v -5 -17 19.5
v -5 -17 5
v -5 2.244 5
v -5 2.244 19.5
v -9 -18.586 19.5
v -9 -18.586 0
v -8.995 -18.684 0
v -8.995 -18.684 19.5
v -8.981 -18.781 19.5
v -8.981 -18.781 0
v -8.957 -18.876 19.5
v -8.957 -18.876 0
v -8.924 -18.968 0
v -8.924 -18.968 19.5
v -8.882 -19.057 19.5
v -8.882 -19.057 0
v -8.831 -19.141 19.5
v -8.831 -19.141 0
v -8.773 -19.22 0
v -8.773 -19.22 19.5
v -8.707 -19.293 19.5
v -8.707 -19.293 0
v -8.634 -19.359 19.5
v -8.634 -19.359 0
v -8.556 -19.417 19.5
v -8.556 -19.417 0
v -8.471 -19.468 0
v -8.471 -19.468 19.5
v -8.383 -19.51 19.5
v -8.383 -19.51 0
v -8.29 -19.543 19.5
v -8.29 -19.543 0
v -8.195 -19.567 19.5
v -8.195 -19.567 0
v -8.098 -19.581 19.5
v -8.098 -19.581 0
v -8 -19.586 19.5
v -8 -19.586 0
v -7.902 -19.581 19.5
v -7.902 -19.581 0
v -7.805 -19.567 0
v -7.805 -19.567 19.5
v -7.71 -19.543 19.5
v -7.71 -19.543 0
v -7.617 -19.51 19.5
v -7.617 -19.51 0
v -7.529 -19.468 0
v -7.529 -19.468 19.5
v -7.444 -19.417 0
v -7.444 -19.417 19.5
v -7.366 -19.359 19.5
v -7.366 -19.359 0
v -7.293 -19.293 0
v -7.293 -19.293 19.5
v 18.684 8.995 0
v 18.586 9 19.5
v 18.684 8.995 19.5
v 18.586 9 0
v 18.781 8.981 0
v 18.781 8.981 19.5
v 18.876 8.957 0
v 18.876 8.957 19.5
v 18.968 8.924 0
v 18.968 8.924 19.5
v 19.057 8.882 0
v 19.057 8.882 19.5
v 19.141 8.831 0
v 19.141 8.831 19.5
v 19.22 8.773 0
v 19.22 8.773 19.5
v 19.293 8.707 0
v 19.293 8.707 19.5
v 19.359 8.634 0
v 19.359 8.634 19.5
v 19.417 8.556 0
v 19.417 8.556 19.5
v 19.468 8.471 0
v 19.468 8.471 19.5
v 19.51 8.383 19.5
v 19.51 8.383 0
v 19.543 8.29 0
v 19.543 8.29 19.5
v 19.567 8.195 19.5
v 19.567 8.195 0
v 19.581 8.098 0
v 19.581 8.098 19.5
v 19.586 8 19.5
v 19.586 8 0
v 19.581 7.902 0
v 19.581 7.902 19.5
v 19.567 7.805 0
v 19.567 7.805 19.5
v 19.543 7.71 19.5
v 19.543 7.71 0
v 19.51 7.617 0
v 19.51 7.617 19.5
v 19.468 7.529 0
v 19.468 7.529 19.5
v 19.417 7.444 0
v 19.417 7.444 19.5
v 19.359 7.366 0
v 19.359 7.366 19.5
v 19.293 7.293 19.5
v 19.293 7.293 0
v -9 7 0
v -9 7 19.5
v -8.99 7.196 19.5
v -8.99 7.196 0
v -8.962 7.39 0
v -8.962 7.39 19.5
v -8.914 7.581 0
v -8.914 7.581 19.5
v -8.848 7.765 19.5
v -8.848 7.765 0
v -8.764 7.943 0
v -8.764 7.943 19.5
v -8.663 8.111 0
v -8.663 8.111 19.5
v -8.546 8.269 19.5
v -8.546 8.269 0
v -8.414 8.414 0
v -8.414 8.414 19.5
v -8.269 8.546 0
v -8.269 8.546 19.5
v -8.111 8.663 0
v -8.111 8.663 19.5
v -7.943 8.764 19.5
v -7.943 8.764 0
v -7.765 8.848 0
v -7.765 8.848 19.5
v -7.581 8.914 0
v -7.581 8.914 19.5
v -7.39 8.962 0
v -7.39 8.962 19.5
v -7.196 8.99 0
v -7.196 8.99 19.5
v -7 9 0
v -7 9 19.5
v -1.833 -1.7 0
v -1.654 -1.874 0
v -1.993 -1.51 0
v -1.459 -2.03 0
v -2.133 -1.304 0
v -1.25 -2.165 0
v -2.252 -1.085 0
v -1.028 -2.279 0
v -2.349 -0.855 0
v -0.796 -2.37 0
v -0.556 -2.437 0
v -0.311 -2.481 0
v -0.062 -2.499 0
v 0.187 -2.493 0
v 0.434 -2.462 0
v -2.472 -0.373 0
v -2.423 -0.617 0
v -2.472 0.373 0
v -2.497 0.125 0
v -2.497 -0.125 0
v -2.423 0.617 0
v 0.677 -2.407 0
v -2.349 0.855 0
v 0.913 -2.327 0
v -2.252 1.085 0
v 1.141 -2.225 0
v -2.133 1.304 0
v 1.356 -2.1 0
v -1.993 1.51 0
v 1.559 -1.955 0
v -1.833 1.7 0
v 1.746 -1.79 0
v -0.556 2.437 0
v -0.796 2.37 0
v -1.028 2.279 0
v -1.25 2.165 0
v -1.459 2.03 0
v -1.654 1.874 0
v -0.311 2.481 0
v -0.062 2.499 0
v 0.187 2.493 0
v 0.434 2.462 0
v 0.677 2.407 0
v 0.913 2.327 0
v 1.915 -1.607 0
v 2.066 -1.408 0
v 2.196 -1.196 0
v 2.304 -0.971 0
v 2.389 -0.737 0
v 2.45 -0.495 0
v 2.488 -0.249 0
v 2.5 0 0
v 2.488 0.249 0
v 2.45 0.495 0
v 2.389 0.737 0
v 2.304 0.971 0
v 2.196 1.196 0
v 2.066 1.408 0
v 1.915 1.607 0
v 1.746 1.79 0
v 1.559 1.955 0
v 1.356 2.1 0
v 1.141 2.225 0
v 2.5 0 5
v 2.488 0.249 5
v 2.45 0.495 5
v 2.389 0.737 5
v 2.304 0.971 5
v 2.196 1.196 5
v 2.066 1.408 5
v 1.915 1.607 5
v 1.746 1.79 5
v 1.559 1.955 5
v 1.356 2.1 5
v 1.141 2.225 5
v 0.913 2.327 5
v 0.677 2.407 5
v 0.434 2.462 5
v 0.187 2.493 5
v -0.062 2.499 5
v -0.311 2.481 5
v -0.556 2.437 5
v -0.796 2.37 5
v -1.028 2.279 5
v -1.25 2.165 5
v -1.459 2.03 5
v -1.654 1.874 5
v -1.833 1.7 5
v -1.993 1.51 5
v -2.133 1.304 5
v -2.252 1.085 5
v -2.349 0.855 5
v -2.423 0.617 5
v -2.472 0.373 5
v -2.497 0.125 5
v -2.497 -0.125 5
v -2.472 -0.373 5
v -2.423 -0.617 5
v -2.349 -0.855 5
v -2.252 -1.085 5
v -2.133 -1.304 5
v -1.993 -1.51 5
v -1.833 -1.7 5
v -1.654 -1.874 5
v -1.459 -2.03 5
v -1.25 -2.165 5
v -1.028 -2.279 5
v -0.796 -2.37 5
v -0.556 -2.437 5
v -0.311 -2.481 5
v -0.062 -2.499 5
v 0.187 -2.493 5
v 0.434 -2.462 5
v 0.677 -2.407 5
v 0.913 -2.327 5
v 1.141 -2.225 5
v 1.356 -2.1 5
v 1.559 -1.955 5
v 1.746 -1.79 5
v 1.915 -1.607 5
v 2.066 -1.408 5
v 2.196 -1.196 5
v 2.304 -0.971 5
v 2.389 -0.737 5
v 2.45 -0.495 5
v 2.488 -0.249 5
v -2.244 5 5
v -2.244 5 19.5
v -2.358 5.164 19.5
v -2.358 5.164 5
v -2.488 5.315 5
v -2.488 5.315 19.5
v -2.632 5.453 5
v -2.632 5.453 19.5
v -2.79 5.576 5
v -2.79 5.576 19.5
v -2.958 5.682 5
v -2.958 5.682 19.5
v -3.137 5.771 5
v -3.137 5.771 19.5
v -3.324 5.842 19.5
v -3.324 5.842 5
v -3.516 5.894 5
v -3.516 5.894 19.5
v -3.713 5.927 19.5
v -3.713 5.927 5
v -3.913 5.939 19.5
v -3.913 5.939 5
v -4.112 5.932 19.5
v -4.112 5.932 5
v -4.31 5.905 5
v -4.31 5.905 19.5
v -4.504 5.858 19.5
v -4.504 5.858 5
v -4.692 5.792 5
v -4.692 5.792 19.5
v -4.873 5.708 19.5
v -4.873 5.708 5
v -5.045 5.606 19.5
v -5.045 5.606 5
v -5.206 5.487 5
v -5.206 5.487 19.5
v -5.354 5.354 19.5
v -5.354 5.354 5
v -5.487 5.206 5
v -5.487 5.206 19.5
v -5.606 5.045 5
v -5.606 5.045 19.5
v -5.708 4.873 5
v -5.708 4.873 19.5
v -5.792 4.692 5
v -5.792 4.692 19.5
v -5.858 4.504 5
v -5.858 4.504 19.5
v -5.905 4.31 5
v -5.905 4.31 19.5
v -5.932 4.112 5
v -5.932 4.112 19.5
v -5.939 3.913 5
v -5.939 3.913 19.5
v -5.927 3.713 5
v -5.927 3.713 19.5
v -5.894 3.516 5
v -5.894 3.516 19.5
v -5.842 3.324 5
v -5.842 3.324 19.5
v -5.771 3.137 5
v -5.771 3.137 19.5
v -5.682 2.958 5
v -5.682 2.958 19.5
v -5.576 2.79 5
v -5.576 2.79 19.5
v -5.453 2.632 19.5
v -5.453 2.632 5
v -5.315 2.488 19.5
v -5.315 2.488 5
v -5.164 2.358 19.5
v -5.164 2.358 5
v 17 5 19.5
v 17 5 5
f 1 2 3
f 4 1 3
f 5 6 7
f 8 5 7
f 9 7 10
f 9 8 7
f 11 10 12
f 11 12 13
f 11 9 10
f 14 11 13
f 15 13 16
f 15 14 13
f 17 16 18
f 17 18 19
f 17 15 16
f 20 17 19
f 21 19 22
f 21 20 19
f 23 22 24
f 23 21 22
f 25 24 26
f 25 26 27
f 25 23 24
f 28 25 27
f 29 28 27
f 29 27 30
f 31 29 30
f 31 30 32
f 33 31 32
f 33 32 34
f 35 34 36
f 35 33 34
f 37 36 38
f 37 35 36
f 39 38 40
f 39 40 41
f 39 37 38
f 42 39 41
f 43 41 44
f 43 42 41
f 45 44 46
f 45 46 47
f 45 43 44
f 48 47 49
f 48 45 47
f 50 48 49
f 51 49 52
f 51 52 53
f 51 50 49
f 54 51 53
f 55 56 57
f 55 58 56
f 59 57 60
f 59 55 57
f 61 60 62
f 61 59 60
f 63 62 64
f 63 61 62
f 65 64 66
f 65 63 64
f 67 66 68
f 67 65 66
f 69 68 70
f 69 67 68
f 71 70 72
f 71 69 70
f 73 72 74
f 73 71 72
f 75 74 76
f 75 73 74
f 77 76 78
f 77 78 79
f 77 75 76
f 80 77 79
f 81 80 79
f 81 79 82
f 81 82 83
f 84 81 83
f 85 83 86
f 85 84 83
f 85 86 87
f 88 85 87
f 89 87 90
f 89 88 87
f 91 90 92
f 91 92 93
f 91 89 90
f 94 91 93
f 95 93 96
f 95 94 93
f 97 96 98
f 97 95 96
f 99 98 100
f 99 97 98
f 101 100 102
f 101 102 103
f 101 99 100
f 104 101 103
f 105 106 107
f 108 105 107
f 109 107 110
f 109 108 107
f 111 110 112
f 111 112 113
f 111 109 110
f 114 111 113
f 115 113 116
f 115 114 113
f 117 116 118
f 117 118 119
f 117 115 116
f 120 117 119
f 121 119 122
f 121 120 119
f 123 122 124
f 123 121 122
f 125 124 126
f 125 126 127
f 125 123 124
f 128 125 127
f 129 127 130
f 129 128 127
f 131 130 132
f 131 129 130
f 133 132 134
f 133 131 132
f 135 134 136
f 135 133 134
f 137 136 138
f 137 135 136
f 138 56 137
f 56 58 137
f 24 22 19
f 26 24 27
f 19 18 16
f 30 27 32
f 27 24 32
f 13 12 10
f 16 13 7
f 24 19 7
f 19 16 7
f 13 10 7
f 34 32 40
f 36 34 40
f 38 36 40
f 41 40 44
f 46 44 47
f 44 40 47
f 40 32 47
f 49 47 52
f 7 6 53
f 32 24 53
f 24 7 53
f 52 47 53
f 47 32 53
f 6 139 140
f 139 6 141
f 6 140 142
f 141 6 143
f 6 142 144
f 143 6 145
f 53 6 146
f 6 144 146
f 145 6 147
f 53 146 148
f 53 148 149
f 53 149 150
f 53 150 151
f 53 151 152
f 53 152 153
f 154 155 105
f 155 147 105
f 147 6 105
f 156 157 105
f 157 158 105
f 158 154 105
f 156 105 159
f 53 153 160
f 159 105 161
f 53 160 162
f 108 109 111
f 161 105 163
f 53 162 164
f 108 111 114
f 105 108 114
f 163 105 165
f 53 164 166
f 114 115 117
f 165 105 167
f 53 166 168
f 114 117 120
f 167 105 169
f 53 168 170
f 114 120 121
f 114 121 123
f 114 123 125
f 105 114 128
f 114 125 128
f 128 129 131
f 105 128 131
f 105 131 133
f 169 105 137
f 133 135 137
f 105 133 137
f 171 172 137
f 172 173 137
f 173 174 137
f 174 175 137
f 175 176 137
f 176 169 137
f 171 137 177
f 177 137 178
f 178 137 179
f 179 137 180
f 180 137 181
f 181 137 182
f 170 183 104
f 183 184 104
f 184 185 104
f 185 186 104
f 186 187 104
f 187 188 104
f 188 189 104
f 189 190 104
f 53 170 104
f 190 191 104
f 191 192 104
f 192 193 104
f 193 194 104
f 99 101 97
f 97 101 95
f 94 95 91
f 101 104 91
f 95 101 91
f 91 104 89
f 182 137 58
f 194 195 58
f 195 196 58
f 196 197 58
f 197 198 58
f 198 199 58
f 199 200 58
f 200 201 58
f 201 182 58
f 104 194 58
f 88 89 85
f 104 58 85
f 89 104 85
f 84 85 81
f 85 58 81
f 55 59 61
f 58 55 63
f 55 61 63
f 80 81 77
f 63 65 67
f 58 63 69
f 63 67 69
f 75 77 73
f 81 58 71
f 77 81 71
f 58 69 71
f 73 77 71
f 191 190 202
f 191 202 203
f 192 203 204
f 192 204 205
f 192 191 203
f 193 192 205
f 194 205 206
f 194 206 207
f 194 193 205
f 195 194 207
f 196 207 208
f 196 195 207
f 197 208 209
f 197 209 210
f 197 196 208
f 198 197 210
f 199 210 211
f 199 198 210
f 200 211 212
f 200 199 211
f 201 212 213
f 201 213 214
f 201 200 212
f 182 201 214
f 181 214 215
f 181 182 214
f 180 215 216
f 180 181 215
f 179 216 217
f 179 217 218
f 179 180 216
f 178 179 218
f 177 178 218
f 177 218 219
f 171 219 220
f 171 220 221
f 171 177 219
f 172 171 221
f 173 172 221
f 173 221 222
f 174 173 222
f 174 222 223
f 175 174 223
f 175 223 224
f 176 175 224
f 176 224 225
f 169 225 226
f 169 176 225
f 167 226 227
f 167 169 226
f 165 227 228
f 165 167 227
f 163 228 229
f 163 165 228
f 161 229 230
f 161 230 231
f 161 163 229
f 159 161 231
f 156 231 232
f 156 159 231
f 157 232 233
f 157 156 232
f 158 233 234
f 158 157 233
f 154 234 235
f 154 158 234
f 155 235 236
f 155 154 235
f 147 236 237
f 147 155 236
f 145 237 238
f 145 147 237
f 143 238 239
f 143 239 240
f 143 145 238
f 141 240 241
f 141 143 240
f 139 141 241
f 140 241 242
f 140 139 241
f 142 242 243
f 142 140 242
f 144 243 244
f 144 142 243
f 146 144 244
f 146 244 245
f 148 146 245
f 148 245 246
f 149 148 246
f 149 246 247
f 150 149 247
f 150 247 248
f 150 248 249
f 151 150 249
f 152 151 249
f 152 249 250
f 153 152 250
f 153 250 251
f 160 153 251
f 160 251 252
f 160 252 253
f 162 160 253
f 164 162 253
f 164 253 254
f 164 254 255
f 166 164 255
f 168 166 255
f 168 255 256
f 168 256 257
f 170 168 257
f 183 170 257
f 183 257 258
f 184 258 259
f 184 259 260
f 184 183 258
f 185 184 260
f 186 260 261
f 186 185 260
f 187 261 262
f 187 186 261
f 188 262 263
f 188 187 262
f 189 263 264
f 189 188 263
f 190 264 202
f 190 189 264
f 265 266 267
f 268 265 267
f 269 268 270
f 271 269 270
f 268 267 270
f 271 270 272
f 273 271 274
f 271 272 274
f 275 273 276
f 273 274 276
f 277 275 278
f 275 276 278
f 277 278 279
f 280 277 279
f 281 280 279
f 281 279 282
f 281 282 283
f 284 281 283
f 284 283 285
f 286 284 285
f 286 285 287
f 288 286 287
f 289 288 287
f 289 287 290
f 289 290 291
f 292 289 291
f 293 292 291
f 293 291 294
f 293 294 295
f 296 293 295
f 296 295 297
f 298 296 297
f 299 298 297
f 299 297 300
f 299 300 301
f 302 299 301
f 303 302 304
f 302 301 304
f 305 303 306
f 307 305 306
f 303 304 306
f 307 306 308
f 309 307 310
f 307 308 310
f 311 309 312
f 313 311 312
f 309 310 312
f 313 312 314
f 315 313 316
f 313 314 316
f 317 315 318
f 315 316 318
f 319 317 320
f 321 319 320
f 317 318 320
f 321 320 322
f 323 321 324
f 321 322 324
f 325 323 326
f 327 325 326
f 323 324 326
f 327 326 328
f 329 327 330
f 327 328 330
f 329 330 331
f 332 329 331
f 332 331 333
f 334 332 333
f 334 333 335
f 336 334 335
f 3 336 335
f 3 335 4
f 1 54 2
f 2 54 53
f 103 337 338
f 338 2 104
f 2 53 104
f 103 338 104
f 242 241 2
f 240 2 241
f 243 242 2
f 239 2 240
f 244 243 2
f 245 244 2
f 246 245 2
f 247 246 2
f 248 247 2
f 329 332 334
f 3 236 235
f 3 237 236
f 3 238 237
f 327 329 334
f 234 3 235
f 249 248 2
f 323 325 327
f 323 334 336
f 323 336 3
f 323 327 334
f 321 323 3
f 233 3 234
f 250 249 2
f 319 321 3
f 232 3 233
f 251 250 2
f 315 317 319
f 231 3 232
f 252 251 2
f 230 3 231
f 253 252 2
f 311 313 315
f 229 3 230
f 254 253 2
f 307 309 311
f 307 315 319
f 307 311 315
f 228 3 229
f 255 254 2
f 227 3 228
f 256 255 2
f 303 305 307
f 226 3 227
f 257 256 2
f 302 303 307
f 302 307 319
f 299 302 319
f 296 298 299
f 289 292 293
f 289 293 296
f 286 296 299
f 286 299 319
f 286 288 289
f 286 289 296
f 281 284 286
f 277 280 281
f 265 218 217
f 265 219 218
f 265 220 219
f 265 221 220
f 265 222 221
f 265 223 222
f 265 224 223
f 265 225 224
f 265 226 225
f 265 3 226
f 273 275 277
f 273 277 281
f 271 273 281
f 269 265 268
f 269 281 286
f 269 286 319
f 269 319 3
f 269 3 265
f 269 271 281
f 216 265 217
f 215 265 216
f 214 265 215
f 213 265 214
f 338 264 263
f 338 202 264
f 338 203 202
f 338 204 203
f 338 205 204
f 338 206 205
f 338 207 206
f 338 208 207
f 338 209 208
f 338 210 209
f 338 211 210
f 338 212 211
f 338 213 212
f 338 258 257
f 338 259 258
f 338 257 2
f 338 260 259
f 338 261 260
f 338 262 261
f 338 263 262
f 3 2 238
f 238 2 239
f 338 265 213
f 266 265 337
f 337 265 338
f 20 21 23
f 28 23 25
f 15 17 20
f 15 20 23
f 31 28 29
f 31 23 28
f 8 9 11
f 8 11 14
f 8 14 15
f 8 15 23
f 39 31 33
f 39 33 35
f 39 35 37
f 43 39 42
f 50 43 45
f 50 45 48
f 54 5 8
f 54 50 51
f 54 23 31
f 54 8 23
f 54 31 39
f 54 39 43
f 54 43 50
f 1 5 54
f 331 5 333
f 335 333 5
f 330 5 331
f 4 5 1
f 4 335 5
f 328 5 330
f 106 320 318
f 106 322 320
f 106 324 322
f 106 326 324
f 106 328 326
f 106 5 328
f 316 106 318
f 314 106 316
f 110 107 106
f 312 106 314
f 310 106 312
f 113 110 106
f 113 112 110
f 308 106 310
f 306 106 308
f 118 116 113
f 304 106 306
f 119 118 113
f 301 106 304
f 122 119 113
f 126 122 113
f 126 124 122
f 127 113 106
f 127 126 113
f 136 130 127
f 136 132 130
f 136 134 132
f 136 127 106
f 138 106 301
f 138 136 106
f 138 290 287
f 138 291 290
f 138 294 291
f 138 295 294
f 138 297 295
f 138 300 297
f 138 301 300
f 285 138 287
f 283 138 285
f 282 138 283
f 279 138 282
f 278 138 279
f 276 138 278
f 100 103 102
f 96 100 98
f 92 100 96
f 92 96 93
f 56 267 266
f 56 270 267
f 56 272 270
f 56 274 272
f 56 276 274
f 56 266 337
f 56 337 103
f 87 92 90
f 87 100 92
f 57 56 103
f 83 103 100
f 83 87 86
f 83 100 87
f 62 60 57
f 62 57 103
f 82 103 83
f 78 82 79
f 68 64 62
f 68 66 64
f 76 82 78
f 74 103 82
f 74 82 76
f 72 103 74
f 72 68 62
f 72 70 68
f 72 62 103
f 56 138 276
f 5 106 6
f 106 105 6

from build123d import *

# Parameters (mm, degrees)
F0_R     = 2.5
F1_DEPTH = 5
F3_DEPTH = 14.5
F4_R     = 2
F5_DEPTH = 14.5
F6_R     = 1
F7_R     = 1
F8_R     = 2


with BuildPart() as f1:
    # F0 (on Top) → F1 (new body)
    with BuildSketch(Plane.XY):
        Polygon((-9, 9), (-9, -21), (21, 9), align=None)
        Circle(F0_R, mode=Mode.SUBTRACT)
    extrude(amount=F1_DEPTH)

    # F2 (on face) → F3 (join)
    with BuildSketch(Plane.XY.offset(5)):
        Polygon((-9, 9), (-9, -21), (-5, -17), (-5, 5), (17, 5), (21, 9), align=None)
    extrude(amount=F3_DEPTH)

    # F4 (on face) → F5 (cut, through all)
    with BuildSketch(Plane.XY.offset(19.5)):
        with Locations((-3.93934, 3.93934)):
            Circle(F4_R)
    extrude(amount=-F5_DEPTH, mode=Mode.SUBTRACT)

    # F6
    f6_edges = [f1.edges().sort_by_distance(p)[0] for p in [
        (21, 9, 9.75),
    ]]
    fillet(f6_edges, radius=F6_R)

    # F7
    f7_edges = [f1.edges().sort_by_distance(p)[0] for p in [
        (-9, -21, 9.75),
    ]]
    fillet(f7_edges, radius=F7_R)

    # F8
    f8_edges = [f1.edges().sort_by_distance(p)[0] for p in [
        (-9, 9, 9.75),
    ]]
    fillet(f8_edges, radius=F8_R)


solid = f1.part
